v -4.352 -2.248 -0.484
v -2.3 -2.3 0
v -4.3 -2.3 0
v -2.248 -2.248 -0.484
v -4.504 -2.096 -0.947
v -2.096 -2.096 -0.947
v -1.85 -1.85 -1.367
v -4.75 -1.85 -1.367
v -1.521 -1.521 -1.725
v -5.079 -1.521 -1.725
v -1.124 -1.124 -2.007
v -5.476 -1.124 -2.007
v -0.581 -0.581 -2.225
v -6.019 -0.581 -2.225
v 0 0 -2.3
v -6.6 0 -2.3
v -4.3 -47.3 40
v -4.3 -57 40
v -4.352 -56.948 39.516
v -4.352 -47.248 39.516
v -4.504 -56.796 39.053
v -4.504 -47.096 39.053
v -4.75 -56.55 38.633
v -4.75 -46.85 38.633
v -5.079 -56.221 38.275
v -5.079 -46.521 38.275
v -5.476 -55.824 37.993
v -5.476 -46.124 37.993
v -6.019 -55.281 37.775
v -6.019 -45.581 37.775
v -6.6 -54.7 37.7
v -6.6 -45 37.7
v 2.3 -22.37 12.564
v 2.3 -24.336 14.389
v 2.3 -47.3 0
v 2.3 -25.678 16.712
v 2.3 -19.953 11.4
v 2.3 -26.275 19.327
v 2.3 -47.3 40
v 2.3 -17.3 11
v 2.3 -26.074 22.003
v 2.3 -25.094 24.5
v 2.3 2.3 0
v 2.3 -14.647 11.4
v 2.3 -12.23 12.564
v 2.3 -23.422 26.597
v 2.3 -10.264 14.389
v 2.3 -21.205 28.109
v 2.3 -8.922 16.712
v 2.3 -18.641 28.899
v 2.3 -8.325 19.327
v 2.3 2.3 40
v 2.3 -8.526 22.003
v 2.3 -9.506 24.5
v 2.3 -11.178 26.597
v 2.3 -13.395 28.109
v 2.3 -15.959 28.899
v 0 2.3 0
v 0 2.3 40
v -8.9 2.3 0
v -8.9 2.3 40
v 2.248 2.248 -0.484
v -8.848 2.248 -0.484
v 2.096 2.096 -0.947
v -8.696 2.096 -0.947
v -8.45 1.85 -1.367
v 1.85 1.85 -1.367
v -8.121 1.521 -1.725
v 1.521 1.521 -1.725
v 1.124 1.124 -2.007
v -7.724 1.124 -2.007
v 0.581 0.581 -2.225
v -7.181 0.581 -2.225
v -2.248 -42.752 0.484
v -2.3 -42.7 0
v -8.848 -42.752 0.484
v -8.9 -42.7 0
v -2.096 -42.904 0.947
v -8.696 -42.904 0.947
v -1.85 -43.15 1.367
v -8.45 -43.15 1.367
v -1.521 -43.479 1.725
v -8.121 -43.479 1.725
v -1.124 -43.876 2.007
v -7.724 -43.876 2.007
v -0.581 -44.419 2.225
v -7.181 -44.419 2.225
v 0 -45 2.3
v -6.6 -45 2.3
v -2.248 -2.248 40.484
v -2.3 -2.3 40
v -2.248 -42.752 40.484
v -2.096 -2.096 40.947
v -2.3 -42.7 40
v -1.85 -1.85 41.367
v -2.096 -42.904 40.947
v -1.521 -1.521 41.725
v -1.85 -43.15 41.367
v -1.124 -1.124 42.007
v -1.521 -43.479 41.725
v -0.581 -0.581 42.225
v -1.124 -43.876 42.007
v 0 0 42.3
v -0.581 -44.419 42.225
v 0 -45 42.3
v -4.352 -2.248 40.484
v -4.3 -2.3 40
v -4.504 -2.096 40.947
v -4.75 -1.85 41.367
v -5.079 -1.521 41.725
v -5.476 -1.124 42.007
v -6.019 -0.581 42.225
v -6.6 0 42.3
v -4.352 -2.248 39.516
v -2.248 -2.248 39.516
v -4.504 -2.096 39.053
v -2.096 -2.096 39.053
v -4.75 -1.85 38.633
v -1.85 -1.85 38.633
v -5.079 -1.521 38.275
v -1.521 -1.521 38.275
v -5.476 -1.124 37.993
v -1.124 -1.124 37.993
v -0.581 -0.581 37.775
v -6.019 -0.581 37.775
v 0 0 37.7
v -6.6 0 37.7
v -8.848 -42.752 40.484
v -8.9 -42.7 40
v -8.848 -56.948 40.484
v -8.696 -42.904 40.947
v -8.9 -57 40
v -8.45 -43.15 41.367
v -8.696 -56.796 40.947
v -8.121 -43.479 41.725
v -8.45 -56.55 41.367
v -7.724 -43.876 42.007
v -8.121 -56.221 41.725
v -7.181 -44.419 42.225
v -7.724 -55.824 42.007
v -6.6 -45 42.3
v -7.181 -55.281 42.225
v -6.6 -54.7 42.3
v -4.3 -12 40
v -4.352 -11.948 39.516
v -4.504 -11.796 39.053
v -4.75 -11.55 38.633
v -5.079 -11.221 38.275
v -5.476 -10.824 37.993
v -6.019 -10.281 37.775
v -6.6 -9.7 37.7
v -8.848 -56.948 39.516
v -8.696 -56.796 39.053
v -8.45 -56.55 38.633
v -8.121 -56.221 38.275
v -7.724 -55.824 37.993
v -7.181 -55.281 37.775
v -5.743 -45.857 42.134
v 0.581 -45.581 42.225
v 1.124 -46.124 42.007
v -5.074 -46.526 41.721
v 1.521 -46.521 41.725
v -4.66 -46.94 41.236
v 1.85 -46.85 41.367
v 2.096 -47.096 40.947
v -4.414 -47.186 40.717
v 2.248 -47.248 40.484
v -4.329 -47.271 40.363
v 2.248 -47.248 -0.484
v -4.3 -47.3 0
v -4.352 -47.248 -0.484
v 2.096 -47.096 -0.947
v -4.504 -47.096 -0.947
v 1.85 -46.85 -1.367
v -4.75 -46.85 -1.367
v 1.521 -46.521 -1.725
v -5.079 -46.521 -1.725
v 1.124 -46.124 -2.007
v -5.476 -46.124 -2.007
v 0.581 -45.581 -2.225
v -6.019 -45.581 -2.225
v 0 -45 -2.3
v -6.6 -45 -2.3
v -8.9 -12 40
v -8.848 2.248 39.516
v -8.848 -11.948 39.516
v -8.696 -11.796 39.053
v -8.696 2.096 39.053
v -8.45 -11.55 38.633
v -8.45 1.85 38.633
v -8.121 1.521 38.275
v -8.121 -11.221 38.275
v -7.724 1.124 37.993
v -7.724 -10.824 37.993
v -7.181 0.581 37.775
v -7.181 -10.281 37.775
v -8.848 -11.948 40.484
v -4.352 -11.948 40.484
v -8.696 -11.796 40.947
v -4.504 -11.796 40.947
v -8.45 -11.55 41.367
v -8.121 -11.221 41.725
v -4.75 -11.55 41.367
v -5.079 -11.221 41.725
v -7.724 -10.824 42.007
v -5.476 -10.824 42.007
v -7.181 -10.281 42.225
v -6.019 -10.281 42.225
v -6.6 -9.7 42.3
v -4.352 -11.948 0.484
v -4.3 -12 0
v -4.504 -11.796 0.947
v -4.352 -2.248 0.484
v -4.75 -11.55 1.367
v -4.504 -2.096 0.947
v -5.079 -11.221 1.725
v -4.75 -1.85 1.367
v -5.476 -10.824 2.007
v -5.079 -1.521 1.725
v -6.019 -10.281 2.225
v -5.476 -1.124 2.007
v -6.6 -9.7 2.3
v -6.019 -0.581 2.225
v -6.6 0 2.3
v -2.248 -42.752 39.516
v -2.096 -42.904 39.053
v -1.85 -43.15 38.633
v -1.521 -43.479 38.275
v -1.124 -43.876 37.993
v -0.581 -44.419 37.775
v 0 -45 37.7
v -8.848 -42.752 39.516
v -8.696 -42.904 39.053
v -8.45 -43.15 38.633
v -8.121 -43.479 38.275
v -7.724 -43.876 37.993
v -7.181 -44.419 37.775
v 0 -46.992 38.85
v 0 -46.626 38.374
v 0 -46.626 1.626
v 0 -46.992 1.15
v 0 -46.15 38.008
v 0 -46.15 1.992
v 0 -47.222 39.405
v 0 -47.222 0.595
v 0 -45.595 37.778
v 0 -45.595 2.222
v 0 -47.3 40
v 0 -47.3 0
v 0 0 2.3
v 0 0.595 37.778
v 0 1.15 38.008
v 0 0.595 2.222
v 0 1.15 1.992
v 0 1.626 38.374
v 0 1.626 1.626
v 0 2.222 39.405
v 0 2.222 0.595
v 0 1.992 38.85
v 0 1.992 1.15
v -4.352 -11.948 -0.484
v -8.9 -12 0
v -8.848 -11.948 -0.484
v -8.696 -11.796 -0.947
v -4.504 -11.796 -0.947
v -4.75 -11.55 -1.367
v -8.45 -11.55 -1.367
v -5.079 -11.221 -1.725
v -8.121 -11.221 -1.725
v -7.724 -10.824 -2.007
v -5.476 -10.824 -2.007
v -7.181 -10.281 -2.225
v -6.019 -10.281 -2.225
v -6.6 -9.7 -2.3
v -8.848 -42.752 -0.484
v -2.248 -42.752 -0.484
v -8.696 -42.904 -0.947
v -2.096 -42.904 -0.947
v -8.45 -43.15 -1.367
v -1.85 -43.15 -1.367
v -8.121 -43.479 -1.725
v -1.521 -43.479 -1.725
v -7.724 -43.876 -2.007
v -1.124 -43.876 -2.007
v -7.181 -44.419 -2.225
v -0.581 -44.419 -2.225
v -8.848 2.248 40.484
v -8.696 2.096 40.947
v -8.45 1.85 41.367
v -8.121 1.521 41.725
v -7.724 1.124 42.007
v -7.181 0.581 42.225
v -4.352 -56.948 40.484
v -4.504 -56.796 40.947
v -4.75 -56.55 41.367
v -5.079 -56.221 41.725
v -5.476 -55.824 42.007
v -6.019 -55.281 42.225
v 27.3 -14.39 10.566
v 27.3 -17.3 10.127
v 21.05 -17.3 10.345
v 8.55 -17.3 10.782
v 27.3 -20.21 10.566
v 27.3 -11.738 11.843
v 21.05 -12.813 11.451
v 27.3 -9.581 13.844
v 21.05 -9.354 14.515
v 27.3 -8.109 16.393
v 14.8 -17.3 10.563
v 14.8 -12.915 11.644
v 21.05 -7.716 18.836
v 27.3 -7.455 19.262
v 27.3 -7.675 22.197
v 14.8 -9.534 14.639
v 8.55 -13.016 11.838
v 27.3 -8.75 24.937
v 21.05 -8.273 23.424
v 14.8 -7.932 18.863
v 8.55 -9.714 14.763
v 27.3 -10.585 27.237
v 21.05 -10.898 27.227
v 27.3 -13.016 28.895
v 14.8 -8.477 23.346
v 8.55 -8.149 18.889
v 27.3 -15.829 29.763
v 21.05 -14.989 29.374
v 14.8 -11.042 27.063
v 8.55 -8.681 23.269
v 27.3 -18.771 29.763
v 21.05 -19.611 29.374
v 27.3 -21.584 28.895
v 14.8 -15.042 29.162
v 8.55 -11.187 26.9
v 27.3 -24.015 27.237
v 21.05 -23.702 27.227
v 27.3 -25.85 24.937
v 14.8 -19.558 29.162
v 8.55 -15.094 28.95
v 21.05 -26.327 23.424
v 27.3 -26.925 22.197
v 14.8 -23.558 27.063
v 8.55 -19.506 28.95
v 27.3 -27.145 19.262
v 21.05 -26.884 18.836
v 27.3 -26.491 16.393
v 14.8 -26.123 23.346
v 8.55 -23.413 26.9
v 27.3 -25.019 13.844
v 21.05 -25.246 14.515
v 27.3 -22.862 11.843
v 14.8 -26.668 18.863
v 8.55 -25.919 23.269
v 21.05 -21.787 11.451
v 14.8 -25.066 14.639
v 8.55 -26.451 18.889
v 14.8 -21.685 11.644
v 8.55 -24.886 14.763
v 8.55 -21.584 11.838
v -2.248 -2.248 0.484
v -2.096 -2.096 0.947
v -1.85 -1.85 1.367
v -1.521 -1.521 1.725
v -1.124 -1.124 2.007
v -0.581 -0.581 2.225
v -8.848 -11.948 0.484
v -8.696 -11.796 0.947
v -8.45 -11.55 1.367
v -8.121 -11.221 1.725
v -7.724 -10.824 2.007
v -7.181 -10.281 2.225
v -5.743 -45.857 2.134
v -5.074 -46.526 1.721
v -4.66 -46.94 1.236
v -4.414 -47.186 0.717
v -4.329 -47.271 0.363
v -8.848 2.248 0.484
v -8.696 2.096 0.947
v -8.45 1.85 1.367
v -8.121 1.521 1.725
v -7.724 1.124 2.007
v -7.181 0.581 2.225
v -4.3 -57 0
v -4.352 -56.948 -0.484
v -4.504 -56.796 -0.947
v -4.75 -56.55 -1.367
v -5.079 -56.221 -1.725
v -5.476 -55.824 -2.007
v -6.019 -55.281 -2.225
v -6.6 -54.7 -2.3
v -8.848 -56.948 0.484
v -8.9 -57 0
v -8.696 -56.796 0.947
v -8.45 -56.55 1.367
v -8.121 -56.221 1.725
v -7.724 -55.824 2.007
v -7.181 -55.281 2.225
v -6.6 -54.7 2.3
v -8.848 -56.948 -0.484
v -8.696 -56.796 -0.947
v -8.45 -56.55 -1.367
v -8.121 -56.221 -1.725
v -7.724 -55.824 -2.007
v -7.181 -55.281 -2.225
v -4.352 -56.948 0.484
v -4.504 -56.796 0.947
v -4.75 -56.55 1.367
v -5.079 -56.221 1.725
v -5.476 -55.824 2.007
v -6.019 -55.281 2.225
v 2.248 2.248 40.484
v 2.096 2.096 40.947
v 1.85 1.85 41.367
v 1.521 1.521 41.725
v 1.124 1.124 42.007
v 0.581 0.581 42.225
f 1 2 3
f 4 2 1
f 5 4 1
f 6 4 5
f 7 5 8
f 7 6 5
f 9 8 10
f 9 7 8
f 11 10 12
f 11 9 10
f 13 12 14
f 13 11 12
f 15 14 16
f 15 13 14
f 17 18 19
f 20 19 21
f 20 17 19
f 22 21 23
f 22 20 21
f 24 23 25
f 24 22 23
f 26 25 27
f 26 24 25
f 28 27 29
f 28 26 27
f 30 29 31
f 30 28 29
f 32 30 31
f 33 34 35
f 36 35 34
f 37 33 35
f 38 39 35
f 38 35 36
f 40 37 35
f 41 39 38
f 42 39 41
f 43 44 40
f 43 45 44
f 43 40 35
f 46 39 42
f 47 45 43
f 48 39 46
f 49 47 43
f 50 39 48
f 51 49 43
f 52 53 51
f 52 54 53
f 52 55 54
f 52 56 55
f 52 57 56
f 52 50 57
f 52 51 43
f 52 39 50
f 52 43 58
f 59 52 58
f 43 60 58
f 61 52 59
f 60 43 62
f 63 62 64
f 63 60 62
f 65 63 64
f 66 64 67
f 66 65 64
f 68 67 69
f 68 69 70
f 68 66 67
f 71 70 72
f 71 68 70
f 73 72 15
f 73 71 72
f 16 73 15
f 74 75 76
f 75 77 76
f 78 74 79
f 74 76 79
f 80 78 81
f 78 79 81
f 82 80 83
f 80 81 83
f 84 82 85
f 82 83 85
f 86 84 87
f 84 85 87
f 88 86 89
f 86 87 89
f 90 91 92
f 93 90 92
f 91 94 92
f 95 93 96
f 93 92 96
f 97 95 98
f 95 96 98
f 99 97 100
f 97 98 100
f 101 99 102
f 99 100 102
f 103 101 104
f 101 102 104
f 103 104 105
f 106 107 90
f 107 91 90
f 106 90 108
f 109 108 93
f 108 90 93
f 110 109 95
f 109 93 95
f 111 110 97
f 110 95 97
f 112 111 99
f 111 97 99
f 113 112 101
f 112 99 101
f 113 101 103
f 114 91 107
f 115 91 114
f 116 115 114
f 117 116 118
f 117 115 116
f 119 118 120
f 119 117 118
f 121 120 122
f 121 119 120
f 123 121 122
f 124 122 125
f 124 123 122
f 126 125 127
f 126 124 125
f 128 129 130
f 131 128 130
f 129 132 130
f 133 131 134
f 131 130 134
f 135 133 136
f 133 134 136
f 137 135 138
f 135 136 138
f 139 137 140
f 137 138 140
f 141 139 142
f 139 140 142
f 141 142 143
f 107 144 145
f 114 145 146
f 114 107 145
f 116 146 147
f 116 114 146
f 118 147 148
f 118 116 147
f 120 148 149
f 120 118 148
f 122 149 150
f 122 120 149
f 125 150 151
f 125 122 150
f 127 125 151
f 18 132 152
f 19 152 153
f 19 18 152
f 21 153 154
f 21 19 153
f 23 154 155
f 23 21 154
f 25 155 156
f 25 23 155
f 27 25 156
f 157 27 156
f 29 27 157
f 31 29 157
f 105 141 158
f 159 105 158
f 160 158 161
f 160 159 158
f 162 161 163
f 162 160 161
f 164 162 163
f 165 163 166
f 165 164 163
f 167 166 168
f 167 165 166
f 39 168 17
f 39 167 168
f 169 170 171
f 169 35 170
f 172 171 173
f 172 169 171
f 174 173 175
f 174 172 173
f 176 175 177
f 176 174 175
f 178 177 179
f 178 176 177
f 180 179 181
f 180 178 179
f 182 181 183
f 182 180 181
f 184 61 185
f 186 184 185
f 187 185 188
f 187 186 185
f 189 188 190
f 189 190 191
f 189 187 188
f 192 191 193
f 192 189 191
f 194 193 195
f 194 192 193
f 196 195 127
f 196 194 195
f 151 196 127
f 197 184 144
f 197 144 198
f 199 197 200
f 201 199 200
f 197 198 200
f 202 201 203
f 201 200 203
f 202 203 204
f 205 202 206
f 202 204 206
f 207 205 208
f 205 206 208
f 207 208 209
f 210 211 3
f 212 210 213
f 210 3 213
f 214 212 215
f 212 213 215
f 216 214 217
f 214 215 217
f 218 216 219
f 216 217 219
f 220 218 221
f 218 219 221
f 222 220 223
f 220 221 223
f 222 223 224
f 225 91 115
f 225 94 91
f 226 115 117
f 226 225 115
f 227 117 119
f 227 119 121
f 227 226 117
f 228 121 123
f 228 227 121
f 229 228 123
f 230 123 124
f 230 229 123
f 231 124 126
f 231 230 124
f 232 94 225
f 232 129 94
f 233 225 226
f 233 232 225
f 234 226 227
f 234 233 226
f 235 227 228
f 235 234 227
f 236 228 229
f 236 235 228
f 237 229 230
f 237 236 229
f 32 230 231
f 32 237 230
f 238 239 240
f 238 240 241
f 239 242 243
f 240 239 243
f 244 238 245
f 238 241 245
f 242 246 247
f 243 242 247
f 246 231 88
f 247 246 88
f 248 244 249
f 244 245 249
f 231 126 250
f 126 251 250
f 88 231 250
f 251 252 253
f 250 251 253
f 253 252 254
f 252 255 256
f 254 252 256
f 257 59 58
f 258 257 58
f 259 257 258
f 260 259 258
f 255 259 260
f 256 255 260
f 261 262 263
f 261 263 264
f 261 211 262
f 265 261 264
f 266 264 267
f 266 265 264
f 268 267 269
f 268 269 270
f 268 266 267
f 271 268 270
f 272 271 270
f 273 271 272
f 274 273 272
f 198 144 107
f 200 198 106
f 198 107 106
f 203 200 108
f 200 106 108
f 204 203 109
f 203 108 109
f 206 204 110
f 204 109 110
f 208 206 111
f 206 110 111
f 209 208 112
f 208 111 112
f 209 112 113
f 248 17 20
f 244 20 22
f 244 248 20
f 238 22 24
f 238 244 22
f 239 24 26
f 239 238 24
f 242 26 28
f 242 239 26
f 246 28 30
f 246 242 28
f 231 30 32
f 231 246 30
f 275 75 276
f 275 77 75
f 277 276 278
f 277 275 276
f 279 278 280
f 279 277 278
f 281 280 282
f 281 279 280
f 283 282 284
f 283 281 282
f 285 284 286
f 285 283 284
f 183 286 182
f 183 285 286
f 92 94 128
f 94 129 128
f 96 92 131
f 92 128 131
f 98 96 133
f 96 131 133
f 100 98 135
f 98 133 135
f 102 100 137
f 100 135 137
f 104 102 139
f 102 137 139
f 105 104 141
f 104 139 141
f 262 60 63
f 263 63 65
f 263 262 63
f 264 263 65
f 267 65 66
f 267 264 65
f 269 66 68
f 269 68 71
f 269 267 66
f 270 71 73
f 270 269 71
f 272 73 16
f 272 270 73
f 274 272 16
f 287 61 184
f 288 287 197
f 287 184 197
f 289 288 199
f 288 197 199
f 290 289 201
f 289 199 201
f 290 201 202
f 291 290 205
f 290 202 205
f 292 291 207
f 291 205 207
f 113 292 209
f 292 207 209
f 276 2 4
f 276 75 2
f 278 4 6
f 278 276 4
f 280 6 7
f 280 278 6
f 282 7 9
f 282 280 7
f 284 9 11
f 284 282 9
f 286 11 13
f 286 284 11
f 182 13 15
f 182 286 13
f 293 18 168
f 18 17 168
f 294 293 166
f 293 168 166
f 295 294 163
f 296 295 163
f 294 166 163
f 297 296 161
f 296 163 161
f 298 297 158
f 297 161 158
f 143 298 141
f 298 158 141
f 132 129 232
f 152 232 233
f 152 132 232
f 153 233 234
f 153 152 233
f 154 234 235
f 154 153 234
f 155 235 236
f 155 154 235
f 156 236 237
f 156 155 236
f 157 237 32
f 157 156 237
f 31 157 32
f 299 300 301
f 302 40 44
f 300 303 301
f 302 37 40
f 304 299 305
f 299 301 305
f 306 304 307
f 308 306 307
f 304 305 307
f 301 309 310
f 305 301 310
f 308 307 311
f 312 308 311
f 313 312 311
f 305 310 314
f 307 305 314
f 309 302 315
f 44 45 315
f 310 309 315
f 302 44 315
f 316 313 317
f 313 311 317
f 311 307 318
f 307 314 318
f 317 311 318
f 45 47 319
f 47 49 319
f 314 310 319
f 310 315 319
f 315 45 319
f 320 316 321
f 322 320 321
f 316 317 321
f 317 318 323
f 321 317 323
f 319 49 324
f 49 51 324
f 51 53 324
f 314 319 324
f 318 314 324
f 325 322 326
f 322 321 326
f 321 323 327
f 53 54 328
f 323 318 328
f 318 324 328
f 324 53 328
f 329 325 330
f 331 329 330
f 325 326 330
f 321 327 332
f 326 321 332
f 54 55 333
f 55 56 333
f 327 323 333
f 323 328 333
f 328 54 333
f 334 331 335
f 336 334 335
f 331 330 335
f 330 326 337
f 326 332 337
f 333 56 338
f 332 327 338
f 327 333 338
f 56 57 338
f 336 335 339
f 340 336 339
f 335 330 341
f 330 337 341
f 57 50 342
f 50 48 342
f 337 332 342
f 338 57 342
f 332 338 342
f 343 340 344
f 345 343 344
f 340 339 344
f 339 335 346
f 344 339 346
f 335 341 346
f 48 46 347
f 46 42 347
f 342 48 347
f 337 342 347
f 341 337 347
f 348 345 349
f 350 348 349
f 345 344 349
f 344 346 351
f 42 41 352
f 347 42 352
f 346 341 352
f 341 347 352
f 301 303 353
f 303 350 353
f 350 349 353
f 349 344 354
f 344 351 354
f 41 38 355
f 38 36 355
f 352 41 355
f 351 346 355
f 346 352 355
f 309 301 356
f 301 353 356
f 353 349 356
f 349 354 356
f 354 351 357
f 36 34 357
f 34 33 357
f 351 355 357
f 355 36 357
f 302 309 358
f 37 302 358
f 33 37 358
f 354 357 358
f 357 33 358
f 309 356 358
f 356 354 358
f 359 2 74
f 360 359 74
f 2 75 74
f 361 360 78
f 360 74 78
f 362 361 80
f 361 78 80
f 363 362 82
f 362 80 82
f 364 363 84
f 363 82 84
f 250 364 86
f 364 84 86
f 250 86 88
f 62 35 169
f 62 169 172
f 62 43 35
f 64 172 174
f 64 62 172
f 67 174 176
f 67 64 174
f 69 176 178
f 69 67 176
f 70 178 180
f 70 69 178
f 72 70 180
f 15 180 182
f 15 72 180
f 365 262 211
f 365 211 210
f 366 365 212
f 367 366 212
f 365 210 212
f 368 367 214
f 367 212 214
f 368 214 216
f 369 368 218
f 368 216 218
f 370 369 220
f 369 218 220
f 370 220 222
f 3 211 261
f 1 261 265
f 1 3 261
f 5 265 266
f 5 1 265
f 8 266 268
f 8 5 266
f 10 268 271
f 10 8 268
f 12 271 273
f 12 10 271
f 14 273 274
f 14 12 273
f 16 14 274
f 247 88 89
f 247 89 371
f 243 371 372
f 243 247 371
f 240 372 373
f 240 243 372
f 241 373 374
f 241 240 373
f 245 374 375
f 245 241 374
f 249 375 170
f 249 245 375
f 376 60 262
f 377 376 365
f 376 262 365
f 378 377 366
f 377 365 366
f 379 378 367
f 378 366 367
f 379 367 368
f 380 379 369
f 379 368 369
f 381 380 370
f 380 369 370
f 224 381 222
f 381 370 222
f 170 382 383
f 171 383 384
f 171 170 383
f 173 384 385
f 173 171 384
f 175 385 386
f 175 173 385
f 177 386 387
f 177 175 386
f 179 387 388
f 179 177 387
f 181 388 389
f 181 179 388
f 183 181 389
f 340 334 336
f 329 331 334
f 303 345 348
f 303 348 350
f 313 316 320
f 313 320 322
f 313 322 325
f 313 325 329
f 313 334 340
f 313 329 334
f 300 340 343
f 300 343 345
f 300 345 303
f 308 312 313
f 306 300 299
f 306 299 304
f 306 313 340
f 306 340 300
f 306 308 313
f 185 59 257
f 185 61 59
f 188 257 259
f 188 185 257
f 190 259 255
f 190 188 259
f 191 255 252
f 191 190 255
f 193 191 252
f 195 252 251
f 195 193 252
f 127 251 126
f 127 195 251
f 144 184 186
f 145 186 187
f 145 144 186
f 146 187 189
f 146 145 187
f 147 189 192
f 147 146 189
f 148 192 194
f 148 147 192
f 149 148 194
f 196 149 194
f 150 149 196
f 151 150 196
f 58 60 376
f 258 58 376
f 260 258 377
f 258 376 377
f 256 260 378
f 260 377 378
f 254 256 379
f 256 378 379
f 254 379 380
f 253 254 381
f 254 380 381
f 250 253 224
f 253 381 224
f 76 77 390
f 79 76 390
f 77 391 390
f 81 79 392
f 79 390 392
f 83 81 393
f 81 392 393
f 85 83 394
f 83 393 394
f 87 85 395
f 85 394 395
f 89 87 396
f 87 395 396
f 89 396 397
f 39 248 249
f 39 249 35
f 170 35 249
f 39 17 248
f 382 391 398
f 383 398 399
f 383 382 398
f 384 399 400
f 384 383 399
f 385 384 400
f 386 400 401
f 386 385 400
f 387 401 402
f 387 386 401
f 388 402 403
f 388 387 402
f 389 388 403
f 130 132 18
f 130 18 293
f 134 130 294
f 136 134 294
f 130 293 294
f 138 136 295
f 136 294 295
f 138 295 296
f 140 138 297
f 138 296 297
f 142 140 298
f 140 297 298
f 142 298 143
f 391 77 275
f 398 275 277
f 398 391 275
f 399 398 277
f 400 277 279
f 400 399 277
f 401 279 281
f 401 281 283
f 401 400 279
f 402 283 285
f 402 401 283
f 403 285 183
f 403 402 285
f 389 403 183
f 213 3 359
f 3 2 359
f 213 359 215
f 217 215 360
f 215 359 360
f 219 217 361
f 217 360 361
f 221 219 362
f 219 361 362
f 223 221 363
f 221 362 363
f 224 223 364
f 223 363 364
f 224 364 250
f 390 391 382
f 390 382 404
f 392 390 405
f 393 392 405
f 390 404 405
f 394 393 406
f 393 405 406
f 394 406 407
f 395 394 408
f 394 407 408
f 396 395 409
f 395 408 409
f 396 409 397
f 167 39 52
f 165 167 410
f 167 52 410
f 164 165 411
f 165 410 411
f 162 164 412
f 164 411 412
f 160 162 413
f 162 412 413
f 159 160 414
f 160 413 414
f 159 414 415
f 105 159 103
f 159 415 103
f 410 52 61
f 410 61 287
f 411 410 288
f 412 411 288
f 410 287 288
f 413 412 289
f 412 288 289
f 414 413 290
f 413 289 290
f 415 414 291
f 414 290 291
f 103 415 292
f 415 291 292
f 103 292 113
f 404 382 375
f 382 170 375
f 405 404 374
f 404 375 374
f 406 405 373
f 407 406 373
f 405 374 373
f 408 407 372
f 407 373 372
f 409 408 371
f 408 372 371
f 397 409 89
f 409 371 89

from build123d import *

# Parameters (mm, degrees)
EXTRU_MINCE1_DEPTH         = 2.3
CONG_1_R                   = 2.3
ESQUISSE2_W                = 40
ESQUISSE2_H                = 49.6
BOSS_EXTRU_1_DEPTH         = 2.3
R_P_TITION_LIN_AIRE1_COUNT = 2
R_P_TITION_LIN_AIRE1_PITCH = 40
CONG_2_R                   = 2.3
ESQUISSE3_R                = 9
BOSS_EXTRU_2_DEPTH         = 25
BOSS_EXTRU_2_DRAFT         = -2


with BuildPart() as part:
    # Esquisse1 → Extru.-Mince1 (new, symmetric)
    with BuildSketch(Plane.XY):
        Polygon((-4.3, -57), (-4.3, -47.3), (2.3, -47.3), (2.3, 2.3), (-8.9, 2.3), (-8.9, -12), (-4.3, -12), (-4.3, -2.3), (-2.3, -2.3), (-2.3, -42.7), (-8.9, -42.7), (-8.9, -57), align=None)
    extru_mince1 = extrude(amount=EXTRU_MINCE1_DEPTH, both=True)

    # Congé1
    cong_1_edges = [part.edges().sort_by_distance(p)[0] for p in [
        (-6.6, -57, -2.3),
        (-4.3, -52.15, -2.3),
        (-1, -47.3, -2.3),
        (2.3, -22.5, -2.3),
        (-3.3, 2.3, -2.3),
        (-8.9, -4.85, -2.3),
        (-6.6, -12, -2.3),
        (-4.3, -7.15, -2.3),
        (-3.3, -2.3, -2.3),
        (-2.3, -22.5, -2.3),
        (-5.6, -42.7, -2.3),
        (-8.9, -49.85, -2.3),
        (-5.6, -42.7, 2.3),
        (-2.3, -22.5, 2.3),
        (-3.3, -2.3, 2.3),
        (-4.3, -7.15, 2.3),
        (-6.6, -12, 2.3),
        (-8.9, -4.85, 2.3),
        (-3.3, 2.3, 2.3),
        (2.3, -22.5, 2.3),
        (-1, -47.3, 2.3),
        (-4.3, -52.15, 2.3),
        (-6.6, -57, 2.3),
        (-8.9, -49.85, 2.3),
    ]]
    fillet(cong_1_edges, radius=CONG_1_R - 0.0001)  # a hair under: the kernel refuses the full size

    # Esquisse2 → Boss.-Extru.1 (add)
    with BuildSketch(Plane(origin=(0, 0, 0), x_dir=(0, 0, -1), z_dir=(1, 0, 0))):
        with Locations((-20, -22.5)):
            Rectangle(ESQUISSE2_W, ESQUISSE2_H)
    extrude(amount=BOSS_EXTRU_1_DEPTH)

    # Répétition linéaire1: Extru.-Mince1 ×2
    with Locations(*[(0, 0, i * R_P_TITION_LIN_AIRE1_PITCH) for i in range(1, R_P_TITION_LIN_AIRE1_COUNT)]):
        add(extru_mince1)

    # Congé2
    cong_2_edges = [part.edges().sort_by_distance(p)[0] for p in [
        (-5.6, -42.7, 42.3),
        (-2.3, -22.5, 42.3),
        (-3.3, -2.3, 42.3),
        (-4.3, -7.15, 42.3),
        (-6.6, -12, 42.3),
        (-8.9, -4.85, 42.3),
        (-3.3, 2.3, 42.3),
        (2.3, -22.5, 42.3),
        (-1, -47.3, 42.3),
        (-4.3, -52.15, 42.3),
        (-6.6, -57, 42.3),
        (-8.9, -49.85, 42.3),
        (-2.15, -47.3, 37.7),
        (-4.3, -52.15, 37.7),
        (-6.6, -57, 37.7),
        (-8.9, -49.85, 37.7),
        (-5.6, -42.7, 37.7),
        (-2.3, -22.5, 37.7),
        (-3.3, -2.3, 37.7),
        (-4.3, -7.15, 37.7),
        (-6.6, -12, 37.7),
        (-8.9, -4.85, 37.7),
        (-4.45, 2.3, 37.7),
    ]]
    fillet(cong_2_edges, radius=CONG_2_R - 0.0001)  # a hair under: the kernel refuses the full size


with BuildPart() as boss_extru_2_tool:
    # Esquisse3 → Boss.-Extru.2 (with draft: the straight prism first)
    with BuildSketch(Plane(origin=(2.3, 0, 0), x_dir=(0, 0, -1), z_dir=(1, 0, 0))):
        with Locations((-20, -17.3)):
            Circle(ESQUISSE3_R)
    extrude(amount=BOSS_EXTRU_2_DEPTH)
    # Boss.-Extru.2: the draft: its side faces are tilted about the plane it starts from
    boss_extru_2_sides = [boss_extru_2_tool.faces().sort_by_distance(p)[0] for p in [
        (14.8, -17.3, 29),
    ]]
    draft(boss_extru_2_sides, Plane(origin=(2.3, 0, 0), x_dir=(0, 0, -1), z_dir=(1, 0, 0)), BOSS_EXTRU_2_DRAFT)


with BuildPart() as part_1:
    add(part.part)

    # Boss.-Extru.2: add boss_extru_2_tool
    add(boss_extru_2_tool.part)


solid = part_1.part
